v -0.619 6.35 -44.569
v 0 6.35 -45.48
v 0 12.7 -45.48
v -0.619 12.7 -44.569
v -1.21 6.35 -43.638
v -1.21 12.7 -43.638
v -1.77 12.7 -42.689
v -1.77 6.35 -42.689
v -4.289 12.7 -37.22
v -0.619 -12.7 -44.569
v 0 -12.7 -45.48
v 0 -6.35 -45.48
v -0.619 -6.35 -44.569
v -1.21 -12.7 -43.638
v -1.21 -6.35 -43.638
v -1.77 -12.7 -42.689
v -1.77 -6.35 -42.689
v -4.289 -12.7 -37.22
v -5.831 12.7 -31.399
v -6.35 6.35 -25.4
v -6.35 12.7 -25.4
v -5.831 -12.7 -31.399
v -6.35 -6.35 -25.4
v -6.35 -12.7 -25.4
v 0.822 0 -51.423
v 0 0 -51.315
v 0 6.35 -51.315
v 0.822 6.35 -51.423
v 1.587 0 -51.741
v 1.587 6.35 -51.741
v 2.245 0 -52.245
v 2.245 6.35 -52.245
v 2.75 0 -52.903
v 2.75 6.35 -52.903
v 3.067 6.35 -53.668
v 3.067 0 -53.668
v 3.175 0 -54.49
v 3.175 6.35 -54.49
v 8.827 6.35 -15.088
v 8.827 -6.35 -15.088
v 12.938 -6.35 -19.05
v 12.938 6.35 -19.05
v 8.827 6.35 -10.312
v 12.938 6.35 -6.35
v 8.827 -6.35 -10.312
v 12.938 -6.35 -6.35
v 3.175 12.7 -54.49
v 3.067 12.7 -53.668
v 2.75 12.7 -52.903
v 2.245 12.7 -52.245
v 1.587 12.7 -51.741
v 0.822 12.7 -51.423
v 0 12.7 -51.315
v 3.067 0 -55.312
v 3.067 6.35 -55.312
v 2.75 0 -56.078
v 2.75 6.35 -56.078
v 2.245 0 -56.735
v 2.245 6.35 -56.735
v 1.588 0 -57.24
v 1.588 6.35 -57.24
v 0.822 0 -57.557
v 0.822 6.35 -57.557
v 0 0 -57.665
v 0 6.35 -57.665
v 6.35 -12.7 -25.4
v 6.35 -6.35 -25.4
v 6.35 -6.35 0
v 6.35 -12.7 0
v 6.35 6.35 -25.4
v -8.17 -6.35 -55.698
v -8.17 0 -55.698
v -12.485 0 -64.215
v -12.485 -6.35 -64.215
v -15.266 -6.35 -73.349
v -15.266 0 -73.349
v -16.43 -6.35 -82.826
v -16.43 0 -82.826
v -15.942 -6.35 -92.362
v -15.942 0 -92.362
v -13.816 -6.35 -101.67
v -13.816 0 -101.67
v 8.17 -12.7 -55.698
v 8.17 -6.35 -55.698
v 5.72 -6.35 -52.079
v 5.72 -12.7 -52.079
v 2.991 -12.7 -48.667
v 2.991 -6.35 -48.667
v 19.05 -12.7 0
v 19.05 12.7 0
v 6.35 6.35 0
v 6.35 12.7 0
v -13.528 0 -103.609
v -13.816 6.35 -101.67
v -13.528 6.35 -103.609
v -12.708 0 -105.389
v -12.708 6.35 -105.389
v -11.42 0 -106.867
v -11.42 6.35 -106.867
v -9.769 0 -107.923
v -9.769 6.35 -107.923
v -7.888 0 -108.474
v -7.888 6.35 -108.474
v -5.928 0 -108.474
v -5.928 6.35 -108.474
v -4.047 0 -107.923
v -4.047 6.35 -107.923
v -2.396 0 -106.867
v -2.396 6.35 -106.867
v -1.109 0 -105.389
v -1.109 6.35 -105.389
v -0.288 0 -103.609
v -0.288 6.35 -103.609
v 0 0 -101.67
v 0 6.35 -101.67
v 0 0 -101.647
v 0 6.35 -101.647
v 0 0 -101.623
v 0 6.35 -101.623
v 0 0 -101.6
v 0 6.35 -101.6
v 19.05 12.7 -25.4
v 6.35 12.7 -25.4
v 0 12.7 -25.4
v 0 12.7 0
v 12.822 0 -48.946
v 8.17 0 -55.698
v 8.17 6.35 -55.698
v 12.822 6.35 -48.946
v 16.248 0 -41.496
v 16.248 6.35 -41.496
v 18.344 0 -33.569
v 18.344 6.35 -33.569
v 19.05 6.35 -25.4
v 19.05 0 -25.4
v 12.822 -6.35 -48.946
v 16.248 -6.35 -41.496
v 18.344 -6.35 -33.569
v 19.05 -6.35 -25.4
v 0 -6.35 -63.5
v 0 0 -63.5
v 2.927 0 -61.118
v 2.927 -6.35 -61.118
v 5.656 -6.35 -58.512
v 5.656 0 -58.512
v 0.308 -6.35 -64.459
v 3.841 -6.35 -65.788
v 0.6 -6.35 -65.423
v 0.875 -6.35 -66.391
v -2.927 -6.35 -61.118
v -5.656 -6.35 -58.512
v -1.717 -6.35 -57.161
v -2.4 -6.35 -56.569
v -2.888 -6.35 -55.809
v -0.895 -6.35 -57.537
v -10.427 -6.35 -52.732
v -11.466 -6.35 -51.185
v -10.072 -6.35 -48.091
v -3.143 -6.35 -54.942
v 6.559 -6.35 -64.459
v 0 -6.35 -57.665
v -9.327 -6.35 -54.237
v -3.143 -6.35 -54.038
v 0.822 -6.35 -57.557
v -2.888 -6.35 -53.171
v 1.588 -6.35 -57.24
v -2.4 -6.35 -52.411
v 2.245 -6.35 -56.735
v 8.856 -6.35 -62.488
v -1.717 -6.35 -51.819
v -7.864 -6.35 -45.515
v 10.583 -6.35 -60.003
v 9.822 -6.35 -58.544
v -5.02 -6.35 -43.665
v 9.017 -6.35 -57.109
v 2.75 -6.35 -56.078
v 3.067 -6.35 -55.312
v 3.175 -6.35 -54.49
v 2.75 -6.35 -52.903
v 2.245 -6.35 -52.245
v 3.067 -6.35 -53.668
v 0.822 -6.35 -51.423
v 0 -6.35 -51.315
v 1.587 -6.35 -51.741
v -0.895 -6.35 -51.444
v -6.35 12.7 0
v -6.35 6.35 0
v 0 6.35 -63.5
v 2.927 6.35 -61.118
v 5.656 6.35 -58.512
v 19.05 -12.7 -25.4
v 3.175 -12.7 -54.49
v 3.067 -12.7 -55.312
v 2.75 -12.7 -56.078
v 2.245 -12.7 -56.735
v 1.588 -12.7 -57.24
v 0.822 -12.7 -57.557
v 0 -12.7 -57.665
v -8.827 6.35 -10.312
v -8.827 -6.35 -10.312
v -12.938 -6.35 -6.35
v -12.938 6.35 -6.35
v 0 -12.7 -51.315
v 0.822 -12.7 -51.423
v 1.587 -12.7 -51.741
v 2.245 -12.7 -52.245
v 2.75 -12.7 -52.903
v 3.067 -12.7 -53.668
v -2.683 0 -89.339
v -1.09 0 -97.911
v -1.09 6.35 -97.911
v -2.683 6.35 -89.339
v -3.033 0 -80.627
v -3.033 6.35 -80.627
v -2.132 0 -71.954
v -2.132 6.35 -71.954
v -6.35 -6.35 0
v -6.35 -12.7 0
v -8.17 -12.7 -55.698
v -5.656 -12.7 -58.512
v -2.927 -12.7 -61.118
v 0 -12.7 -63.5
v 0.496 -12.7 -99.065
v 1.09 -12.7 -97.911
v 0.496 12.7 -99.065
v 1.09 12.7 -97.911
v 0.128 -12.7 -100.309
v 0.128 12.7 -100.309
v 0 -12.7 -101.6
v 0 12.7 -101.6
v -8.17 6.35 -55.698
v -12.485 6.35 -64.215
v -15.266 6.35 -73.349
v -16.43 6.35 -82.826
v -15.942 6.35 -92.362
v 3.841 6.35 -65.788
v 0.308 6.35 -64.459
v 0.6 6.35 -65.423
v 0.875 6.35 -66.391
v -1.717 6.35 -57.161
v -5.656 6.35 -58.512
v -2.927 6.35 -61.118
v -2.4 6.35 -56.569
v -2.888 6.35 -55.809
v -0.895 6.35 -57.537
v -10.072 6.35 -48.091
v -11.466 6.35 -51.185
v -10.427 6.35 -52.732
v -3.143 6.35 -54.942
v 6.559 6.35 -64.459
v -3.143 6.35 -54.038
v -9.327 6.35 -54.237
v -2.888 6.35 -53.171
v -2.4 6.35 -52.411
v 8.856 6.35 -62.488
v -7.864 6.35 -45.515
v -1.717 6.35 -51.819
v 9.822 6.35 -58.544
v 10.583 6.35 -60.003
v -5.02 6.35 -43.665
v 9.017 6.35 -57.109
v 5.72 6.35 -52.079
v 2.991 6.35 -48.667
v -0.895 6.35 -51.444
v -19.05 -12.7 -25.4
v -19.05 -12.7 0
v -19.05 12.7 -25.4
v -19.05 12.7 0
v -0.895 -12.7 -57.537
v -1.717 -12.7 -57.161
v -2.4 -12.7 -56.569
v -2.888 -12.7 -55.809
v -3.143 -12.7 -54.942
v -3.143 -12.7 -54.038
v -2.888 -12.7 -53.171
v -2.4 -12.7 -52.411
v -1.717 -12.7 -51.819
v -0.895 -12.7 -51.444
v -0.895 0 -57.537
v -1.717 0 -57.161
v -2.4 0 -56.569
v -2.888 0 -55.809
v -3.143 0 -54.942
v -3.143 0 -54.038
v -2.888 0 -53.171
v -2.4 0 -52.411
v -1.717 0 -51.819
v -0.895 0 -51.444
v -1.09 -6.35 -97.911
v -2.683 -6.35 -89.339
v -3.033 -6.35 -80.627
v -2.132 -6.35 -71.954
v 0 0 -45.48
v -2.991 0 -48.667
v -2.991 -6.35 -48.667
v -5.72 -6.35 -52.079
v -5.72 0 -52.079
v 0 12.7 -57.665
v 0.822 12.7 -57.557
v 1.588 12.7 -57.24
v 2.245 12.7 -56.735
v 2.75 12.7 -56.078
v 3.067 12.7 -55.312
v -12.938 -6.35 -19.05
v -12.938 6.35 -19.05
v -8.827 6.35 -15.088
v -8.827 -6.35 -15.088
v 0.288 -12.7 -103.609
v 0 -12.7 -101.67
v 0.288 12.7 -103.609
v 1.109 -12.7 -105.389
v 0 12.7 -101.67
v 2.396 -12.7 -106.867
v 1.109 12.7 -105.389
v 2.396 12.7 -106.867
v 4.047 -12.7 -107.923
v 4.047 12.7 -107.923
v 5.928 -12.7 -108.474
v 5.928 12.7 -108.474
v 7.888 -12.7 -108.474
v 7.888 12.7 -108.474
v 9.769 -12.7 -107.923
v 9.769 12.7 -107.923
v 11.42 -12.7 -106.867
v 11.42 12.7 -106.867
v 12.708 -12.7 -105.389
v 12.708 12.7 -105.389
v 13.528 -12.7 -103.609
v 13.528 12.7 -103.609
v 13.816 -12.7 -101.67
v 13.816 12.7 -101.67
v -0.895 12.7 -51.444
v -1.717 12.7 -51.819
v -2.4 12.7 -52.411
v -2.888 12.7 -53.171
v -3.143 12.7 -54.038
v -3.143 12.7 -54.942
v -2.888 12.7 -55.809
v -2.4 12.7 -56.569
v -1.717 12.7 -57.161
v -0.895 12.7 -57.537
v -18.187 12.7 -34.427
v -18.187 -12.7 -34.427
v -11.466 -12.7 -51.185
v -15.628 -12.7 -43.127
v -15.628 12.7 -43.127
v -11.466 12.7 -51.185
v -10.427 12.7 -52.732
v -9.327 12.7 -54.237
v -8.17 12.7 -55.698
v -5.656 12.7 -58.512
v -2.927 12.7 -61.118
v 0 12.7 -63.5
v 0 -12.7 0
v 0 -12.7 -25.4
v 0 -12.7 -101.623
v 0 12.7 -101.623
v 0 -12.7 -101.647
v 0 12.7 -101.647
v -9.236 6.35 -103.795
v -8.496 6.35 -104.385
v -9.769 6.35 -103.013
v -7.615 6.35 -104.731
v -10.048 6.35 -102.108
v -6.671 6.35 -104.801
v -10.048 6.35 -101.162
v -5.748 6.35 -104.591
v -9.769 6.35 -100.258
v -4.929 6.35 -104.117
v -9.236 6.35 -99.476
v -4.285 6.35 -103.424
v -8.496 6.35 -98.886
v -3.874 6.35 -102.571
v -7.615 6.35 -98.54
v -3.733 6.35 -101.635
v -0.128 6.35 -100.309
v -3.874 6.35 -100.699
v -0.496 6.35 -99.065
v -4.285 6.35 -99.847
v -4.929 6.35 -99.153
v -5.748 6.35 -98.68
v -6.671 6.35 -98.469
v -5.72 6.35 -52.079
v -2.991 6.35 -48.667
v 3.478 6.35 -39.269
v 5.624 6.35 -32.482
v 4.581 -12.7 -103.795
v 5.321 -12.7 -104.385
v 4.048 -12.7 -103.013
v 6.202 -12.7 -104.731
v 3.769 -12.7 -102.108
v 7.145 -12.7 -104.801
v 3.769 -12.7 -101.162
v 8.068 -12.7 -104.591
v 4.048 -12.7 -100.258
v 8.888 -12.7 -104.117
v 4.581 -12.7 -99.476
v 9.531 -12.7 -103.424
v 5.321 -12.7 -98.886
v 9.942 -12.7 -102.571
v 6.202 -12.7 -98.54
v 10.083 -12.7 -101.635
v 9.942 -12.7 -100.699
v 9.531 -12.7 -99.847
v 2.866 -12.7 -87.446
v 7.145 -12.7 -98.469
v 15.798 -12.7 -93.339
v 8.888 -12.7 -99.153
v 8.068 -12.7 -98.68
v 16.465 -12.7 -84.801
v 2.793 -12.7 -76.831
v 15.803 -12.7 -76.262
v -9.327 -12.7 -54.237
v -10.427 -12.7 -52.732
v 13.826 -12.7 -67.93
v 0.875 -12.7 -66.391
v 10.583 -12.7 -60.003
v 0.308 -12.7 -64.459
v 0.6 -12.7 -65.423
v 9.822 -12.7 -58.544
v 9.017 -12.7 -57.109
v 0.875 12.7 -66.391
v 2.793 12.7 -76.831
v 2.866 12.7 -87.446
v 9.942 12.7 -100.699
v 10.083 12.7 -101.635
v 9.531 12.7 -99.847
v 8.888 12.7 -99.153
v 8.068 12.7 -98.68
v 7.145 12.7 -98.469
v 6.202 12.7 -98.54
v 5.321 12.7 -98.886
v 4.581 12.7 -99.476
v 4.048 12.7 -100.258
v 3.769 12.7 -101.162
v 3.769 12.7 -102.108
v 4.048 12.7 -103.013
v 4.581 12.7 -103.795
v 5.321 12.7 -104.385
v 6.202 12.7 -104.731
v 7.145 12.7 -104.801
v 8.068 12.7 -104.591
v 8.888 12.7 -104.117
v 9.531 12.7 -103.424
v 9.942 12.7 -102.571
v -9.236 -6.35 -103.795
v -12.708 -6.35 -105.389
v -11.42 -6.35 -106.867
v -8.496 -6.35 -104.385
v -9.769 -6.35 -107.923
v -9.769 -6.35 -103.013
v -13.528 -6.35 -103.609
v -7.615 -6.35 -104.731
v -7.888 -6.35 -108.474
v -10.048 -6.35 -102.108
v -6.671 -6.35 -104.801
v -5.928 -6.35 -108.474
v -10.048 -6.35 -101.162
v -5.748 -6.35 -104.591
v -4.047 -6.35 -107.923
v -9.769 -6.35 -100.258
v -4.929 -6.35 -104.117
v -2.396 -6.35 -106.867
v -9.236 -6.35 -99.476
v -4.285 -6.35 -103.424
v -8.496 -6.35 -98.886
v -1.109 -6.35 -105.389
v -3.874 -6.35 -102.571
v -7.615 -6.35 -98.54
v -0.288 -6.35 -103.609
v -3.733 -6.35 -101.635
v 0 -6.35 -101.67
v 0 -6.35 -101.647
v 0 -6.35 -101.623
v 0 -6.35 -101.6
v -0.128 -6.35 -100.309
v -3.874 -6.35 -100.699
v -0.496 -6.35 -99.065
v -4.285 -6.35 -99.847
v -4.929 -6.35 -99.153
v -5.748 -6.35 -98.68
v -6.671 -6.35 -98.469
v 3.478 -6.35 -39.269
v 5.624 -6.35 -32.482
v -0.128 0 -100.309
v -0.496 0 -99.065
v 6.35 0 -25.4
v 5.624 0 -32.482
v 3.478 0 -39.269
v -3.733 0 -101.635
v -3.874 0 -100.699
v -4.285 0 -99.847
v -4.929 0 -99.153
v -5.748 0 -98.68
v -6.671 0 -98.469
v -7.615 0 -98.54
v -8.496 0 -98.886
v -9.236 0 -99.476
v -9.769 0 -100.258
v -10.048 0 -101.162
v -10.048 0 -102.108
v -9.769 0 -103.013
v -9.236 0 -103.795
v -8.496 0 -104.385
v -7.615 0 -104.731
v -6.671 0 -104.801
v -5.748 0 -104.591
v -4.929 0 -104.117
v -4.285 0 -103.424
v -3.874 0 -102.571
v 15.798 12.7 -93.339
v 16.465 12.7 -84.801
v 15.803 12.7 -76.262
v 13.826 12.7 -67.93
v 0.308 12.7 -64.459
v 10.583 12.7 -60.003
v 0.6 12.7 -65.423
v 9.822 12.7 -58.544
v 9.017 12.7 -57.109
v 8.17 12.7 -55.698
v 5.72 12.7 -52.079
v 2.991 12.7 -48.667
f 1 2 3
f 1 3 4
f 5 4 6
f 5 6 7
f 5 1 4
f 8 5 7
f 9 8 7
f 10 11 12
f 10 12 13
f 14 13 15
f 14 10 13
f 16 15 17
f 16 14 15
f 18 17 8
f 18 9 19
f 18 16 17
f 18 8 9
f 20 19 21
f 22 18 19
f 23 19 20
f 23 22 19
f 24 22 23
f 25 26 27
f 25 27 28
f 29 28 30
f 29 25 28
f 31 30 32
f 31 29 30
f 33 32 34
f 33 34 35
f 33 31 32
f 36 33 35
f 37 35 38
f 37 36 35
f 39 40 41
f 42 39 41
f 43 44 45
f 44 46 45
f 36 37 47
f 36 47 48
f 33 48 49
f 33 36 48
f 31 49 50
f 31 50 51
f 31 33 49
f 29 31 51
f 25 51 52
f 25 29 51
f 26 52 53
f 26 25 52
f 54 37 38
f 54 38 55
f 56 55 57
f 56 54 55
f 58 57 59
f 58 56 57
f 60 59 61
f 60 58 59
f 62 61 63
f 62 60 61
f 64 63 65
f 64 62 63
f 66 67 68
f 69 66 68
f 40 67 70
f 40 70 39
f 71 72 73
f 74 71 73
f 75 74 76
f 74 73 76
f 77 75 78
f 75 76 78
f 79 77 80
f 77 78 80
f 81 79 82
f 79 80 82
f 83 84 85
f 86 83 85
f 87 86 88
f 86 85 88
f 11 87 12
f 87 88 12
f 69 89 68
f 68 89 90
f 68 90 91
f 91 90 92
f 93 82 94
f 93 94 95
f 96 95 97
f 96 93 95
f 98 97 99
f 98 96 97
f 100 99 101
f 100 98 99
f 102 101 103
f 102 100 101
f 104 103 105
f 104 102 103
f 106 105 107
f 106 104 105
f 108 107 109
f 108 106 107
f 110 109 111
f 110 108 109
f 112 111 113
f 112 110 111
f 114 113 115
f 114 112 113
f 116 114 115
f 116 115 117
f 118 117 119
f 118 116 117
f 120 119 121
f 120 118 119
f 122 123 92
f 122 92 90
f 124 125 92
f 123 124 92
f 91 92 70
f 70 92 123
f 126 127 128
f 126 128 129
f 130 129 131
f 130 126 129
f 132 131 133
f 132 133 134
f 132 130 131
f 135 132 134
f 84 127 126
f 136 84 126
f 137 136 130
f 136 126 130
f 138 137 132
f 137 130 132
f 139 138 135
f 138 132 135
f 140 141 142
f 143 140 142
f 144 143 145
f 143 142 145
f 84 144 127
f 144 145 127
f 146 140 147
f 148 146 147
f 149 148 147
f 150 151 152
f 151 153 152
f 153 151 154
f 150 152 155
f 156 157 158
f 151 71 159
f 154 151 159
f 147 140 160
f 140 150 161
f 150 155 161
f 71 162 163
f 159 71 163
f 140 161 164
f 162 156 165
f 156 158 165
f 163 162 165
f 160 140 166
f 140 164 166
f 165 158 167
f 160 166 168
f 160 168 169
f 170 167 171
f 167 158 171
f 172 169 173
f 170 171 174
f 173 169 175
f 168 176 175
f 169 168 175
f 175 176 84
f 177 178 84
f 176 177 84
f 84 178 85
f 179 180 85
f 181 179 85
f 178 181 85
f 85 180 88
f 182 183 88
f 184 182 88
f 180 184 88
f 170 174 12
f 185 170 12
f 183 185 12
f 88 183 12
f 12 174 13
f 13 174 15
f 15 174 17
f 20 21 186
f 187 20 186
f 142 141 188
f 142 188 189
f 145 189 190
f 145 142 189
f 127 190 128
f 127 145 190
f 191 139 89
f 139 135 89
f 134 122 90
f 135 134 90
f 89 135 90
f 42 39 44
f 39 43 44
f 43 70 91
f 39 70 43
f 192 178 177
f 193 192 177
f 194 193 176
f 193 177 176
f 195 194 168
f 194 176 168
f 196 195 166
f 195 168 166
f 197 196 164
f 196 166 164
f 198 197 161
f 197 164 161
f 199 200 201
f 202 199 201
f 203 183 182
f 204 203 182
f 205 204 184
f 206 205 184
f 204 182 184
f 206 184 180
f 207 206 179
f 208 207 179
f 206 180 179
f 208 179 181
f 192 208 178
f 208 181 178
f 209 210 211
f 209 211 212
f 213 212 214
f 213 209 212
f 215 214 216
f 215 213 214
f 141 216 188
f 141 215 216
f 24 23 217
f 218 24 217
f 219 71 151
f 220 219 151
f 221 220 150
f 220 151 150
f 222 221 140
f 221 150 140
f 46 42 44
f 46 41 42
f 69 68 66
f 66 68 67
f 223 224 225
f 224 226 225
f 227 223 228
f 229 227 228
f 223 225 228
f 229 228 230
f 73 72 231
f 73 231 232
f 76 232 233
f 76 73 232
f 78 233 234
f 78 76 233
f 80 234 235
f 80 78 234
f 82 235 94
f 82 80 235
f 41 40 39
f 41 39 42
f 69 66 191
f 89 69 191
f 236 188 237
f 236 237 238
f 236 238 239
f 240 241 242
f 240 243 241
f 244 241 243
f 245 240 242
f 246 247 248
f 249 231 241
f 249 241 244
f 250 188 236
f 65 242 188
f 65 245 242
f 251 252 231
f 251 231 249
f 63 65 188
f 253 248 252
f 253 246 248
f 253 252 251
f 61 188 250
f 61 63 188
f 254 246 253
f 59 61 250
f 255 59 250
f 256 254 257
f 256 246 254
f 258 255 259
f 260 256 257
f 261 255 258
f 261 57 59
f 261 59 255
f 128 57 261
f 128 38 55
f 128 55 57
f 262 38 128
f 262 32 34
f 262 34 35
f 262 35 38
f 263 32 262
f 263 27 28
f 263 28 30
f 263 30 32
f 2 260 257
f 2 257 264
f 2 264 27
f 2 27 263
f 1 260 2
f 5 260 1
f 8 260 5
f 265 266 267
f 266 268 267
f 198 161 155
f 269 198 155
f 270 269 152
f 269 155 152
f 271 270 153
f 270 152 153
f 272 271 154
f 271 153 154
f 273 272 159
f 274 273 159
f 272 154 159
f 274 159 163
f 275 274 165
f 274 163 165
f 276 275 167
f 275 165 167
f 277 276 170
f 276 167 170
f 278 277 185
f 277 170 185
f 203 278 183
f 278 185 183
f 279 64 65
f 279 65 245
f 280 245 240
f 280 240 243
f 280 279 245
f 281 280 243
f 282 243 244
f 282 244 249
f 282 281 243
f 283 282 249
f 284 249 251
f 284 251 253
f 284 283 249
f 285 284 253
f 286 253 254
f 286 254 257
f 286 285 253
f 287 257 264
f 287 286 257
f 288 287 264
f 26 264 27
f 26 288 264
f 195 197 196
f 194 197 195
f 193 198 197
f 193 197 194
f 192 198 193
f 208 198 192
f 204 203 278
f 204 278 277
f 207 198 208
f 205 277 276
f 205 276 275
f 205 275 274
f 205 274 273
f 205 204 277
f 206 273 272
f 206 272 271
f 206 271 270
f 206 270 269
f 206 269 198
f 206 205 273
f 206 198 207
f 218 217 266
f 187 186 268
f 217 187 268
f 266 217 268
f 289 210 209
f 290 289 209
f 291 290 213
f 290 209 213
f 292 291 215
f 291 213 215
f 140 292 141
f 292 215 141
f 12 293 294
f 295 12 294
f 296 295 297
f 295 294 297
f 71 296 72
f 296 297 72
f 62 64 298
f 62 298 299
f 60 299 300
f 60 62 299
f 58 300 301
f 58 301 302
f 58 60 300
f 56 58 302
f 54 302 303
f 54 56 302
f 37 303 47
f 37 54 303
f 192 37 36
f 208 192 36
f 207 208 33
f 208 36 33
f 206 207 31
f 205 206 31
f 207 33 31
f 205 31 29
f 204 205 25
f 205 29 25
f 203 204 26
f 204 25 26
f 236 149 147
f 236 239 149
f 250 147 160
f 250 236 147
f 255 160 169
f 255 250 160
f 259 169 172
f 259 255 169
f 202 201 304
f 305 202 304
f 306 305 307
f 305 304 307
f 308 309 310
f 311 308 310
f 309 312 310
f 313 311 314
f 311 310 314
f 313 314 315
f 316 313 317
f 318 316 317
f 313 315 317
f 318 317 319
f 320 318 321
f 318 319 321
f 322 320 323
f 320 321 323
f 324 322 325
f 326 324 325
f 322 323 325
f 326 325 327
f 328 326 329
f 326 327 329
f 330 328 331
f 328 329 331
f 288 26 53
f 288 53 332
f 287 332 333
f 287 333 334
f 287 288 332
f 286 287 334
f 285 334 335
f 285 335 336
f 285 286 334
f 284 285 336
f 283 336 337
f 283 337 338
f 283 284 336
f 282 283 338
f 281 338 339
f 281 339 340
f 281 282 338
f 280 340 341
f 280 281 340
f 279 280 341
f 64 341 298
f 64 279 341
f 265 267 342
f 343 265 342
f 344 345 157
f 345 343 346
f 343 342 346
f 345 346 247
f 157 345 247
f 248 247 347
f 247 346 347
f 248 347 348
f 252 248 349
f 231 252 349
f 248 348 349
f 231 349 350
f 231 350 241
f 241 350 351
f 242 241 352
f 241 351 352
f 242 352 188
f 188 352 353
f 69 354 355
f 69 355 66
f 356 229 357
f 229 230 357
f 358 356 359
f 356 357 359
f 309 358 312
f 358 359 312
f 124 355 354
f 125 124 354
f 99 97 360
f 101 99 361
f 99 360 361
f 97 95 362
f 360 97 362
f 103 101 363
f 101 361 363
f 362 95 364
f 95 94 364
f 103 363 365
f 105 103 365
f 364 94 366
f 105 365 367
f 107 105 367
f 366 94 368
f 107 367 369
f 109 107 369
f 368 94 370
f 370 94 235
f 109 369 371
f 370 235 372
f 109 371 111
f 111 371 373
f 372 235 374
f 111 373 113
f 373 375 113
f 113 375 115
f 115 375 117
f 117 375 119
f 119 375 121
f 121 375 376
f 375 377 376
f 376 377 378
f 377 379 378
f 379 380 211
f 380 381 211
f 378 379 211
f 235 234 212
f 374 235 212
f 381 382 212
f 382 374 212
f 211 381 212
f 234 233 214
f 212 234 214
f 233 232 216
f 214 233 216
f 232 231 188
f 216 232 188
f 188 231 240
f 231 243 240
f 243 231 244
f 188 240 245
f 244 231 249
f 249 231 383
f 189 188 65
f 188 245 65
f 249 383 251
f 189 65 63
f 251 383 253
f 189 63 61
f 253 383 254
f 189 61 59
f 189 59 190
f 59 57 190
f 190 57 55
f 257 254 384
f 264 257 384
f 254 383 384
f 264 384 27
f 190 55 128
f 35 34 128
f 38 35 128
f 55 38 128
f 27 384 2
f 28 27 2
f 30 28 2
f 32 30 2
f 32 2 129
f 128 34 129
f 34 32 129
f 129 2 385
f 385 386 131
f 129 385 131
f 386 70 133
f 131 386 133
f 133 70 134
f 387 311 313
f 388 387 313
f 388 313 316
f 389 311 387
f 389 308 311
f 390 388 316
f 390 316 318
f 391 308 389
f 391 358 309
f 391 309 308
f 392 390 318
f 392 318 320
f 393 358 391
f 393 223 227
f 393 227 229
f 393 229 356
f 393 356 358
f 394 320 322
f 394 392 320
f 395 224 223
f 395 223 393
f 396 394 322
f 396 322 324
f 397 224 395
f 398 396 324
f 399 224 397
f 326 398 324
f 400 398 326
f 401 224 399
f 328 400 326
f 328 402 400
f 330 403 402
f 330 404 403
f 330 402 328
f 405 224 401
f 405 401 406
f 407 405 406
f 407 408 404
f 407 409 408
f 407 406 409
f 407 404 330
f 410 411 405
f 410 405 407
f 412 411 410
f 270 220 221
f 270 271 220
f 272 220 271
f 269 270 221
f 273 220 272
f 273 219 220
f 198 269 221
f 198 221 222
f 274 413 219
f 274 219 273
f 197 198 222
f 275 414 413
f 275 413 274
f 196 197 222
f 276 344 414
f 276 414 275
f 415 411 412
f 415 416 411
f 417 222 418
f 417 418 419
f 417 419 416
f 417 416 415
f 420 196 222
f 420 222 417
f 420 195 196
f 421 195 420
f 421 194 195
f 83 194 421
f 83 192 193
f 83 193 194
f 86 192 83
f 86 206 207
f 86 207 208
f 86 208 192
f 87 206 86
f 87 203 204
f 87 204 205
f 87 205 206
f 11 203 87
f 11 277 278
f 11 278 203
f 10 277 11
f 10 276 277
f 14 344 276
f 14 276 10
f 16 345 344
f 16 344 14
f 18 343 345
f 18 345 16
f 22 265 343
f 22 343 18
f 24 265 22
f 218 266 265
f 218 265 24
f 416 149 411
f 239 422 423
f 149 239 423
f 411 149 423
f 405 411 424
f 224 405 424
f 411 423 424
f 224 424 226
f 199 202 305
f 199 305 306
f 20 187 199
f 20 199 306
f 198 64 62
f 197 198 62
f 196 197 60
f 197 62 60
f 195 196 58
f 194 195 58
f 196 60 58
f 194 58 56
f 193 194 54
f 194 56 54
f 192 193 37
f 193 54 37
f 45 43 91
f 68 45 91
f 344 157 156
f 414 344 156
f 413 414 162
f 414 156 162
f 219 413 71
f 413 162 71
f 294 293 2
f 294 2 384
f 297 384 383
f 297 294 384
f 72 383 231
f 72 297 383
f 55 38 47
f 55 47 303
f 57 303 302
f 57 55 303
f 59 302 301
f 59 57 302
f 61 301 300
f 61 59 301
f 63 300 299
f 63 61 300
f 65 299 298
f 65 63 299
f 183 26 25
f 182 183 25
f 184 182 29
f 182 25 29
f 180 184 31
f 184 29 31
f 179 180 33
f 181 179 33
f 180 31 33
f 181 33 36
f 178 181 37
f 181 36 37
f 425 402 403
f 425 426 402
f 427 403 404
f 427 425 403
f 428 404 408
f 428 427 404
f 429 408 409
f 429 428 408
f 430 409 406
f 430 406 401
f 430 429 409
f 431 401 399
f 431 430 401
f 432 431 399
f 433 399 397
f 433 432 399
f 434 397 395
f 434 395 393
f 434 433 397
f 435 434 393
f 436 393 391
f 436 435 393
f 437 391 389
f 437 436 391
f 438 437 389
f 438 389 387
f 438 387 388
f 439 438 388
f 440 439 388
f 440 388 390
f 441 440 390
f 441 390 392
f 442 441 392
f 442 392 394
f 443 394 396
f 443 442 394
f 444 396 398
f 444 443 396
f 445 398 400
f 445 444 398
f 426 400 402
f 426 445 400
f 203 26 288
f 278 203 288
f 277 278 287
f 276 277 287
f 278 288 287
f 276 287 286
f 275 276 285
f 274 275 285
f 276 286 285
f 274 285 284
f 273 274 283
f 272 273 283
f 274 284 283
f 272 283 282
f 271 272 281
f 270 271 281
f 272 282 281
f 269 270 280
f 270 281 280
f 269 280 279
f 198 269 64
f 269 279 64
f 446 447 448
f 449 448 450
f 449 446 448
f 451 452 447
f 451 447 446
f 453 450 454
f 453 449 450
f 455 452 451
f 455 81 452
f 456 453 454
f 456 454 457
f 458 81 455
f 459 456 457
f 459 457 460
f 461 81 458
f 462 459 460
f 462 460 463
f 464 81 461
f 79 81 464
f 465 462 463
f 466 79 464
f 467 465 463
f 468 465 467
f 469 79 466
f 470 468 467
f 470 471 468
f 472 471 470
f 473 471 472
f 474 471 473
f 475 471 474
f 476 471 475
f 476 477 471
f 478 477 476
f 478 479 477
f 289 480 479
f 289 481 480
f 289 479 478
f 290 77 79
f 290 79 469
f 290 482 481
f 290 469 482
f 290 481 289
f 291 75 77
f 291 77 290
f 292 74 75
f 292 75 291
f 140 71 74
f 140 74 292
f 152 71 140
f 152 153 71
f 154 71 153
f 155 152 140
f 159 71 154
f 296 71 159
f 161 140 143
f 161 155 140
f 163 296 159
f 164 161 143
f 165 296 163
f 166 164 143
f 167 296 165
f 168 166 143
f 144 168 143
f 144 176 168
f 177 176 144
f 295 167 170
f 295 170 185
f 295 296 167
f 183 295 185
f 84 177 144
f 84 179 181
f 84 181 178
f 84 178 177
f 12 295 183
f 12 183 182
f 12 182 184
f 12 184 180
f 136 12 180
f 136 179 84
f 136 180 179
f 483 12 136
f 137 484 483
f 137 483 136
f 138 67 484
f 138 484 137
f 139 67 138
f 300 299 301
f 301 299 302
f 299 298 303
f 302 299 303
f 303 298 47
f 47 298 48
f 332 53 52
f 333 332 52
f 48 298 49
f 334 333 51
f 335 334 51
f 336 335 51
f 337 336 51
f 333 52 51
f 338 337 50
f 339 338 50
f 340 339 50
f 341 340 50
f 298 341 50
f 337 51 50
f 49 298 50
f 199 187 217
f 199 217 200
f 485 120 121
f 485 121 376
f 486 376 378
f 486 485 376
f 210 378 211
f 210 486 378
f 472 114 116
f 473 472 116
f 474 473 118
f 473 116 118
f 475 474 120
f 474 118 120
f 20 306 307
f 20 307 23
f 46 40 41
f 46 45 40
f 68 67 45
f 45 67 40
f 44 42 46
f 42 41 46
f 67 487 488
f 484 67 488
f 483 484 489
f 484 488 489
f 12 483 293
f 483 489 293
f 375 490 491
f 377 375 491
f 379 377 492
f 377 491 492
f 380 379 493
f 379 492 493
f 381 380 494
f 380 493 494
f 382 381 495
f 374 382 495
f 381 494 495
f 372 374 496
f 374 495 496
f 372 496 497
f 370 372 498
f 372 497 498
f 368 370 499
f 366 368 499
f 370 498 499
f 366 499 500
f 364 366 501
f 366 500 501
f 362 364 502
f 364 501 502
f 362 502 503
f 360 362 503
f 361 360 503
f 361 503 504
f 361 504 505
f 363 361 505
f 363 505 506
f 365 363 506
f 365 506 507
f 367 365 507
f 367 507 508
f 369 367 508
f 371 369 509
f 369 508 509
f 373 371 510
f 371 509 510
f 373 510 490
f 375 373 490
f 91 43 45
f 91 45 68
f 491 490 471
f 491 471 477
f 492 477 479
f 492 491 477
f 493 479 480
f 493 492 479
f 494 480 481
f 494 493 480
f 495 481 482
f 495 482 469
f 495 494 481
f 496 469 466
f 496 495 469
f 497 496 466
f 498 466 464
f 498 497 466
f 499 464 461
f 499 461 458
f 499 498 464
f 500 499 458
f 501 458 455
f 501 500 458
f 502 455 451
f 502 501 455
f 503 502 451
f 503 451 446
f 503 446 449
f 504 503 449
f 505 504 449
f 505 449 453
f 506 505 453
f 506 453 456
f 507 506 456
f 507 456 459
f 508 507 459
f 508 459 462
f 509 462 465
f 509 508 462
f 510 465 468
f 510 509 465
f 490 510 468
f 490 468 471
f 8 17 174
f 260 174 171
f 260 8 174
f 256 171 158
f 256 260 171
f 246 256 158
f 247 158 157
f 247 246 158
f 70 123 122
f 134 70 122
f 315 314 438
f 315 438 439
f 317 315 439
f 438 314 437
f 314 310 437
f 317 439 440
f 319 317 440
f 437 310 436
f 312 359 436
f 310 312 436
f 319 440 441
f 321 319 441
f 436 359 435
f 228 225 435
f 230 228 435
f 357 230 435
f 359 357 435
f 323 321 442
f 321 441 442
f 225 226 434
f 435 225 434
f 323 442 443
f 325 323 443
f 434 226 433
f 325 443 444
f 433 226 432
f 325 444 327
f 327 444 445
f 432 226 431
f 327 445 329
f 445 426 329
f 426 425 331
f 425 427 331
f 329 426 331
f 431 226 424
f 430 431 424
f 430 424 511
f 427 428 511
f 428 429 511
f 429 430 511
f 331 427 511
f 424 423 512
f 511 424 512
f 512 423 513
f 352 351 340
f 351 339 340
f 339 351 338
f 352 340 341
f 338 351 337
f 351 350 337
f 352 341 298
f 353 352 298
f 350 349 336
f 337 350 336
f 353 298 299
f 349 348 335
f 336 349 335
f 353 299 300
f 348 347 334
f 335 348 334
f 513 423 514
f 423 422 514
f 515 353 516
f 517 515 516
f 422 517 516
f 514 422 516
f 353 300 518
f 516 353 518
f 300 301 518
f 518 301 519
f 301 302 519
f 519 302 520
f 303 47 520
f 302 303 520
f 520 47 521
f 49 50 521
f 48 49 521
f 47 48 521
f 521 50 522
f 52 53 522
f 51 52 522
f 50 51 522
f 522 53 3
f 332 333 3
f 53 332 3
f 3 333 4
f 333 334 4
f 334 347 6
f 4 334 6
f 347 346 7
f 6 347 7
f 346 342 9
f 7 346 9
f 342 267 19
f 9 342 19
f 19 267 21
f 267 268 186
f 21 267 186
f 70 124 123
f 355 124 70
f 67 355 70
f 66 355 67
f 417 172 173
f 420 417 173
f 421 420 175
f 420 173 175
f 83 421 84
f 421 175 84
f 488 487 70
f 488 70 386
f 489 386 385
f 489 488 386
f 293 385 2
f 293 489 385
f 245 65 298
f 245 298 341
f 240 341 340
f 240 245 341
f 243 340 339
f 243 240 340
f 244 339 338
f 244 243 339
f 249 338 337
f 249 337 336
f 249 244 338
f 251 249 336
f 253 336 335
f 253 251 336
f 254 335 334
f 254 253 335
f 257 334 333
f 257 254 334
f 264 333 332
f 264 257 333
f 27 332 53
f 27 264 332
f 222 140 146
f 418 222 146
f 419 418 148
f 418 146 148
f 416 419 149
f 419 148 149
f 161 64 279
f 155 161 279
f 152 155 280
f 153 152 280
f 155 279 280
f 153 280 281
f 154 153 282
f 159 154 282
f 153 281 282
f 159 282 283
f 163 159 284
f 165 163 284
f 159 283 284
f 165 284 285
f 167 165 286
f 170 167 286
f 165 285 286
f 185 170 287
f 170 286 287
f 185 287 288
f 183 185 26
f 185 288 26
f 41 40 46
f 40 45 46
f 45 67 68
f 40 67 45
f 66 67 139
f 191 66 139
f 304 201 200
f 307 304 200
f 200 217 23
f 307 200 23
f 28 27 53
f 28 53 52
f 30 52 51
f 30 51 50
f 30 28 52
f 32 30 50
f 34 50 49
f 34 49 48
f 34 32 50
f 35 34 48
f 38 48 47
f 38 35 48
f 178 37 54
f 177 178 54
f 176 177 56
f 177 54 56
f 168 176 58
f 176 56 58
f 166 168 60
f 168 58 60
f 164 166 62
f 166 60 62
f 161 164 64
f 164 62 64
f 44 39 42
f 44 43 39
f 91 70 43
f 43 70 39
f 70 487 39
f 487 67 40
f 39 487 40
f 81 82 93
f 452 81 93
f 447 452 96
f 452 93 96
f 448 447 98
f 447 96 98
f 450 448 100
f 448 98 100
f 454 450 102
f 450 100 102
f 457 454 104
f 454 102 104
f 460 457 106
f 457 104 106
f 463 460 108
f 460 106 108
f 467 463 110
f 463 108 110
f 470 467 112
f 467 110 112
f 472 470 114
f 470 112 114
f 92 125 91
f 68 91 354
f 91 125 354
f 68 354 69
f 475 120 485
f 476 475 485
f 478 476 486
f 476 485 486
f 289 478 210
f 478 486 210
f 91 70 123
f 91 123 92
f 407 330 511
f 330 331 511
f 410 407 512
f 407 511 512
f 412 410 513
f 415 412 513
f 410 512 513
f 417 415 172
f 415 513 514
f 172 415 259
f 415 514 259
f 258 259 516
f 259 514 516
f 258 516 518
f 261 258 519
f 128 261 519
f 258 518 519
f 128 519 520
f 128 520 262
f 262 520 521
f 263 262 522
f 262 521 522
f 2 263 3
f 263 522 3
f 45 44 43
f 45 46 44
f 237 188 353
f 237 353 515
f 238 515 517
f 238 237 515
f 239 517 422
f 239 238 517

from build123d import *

# Parameters (mm, degrees)
F1_DEPTH      = 12.7
F1_DEPTH_BACK = 12.7
F2_DEPTH      = 6.35
F2_DEPTH_BACK = 6.35
F3_DEPTH      = 6.35
F3_DEPTH_BACK = 6.35
F0_W          = 6.35
F0_H          = 25.4
F4_DEPTH      = 12.7
F4_DEPTH_BACK = 12.7
F0_R          = 3.175
F5_DEPTH      = 6.35
F5_DEPTH_BACK = 6.35
F6_DEPTH      = 12.7
F6_DEPTH_BACK = 12.7
F7_DEPTH      = 6.35
F7_DEPTH_BACK = 6.35
F8_DEPTH      = 12.7
F8_DEPTH_BACK = 12.7


with BuildPart() as f1:
    # F0 (on Front) → F1 (new body, two sides)
    with BuildSketch(Plane.XZ) as f1_sk:
        Polygon((-8.827155169, -10.3124072454), (-6.35, 0), (-19.05, 0), (-19.05, -25.4), (-6.35, -25.4), (-8.827155169, -15.0875927546), (-12.9381986335, -19.05), (-12.9381986335, -12.7), (-12.9381986335, -6.35), align=None)
        Polygon((-6.35, -25.4), (-6.35, 0), (-8.827155169, -10.3124072454), (-12.9381986335, -6.35), (-12.9381986335, -12.7), (-12.9381986335, -19.05), (-8.827155169, -15.0875927546), align=None)
    extrude(amount=-F1_DEPTH)
    extrude(f1_sk.sketch, amount=F1_DEPTH_BACK)


with BuildPart() as f1b:
    # F0 (on Front) → F1, piece 2 (new body, two sides)
    with BuildSketch(Plane.XZ) as f1_2_sk:
        Polygon((19.05, 0), (6.35, 0), (8.827155169, -10.3124072454), (12.9381986335, -6.35), (12.9381986335, -12.7), (12.9381986335, -19.05), (8.827155169, -15.0875927546), (6.35, -25.4), (19.05, -25.4), align=None)
        Polygon((8.827155169, -10.3124072454), (6.35, 0), (6.35, -25.4), (8.827155169, -15.0875927546), (12.9381986335, -19.05), (12.9381986335, -12.7), (12.9381986335, -6.35), align=None)
    extrude(amount=-F1_DEPTH)
    extrude(f1_2_sk.sketch, amount=F1_DEPTH_BACK)


with BuildPart() as f2_tool:
    # F0 (on Front) → F2 (new body, two sides)
    with BuildSketch(Plane.XZ) as f2_sk:
        Polygon((8.827155169, -10.3124072454), (6.35, 0), (6.35, -25.4), (8.827155169, -15.0875927546), (12.9381986335, -19.05), (12.9381986335, -12.7), (12.9381986335, -6.35), align=None)
        Polygon((-6.35, -25.4), (-6.35, 0), (-8.827155169, -10.3124072454), (-12.9381986335, -6.35), (-12.9381986335, -12.7), (-12.9381986335, -19.05), (-8.827155169, -15.0875927546), align=None)
    extrude(amount=F2_DEPTH)
    extrude(f2_sk.sketch, amount=-F2_DEPTH_BACK)


with BuildPart() as f1_1:
    add(f1.part)

    # F2: cut by f2_tool
    add(f2_tool.part, mode=Mode.SUBTRACT)

    # F0 (on Front) → F6 (join, two sides)
    with BuildSketch(Plane.XZ) as f6_sk:
        with BuildLine():
            ThreePointArc((-1.7703138016, -42.6892323508), (-5.1856702357, -34.3427495905), (-6.35, -25.4))
            Line((-6.35, -25.4), (-19.05, -25.4))
            ThreePointArc((-19.05, -25.4), (-17.1147005889, -38.8384480167), (-11.4660888148, -51.1847208929))
            ThreePointArc((-11.4660888148, -51.1847208929), (-7.8640905354, -45.515061734), (-1.7703138016, -42.6892323508))
        make_face()
        with BuildLine():
            ThreePointArc((-8.1699275215, -55.6977049698), (-4.3890156004, -50.3459576296), (0, -45.4804631421))
            ThreePointArc((0, -45.4804631421), (-0.9181956043, -44.1058022562), (-1.7703138016, -42.6892323508))
            ThreePointArc((-1.7703138016, -42.6892323508), (-7.8640905354, -45.515061734), (-11.4660888148, -51.1847208929))
            ThreePointArc((-11.4660888148, -51.1847208929), (-9.8842619862, -53.4896029249), (-8.1699275215, -55.6977049698))
        make_face()
        with BuildLine():
            Line((0, -51.315231571), (0, -45.4804631421))
            ThreePointArc((0, -45.4804631421), (-4.3890156004, -50.3459576296), (-8.1699275215, -55.6977049698))
            ThreePointArc((-8.1699275215, -55.6977049698), (-4.3171295265, -59.8419575549), (0, -63.5))
            Line((0, -63.5), (0, -57.665231571))
            ThreePointArc((0, -57.665231571), (-3.175, -54.490231571), (0, -51.315231571))
        make_face()
        with BuildLine():
            ThreePointArc((8.1699275215, -55.6977049698), (4.3890156004, -50.3459576296), (0, -45.4804631421))
            Line((0, -45.4804631421), (0, -51.315231571))
            ThreePointArc((0, -51.315231571), (2.2450640303, -52.2451675408), (3.175, -54.490231571))
            ThreePointArc((3.175, -54.490231571), (2.2450640303, -56.7352956013), (0, -57.665231571))
            Line((0, -57.665231571), (0, -63.5))
            ThreePointArc((0, -63.5), (4.3171295265, -59.8419575549), (8.1699275215, -55.6977049698))
        make_face()
        with BuildLine():
            ThreePointArc((13.816319406, -101.6703248024), (16.2998142634, -80.5187022847), (10.5831374671, -60.0033790301))
            ThreePointArc((10.5831374671, -60.0033790301), (6.5593543364, -64.4588054029), (0.8753606705, -66.3911280603))
            ThreePointArc((0.8753606705, -66.3911280603), (3.0617092136, -82.1370373381), (1.0895635546, -97.9112067437))
            ThreePointArc((1.0895635546, -97.9112067437), (0.282876498, -99.6782440765), (0, -101.6))
            ThreePointArc((0, -101.6), (8.94874e-05, -101.6351624012), (0, -101.6703248024))
            ThreePointArc((0, -101.6703248024), (6.908159703, -108.5434115916), (13.816319406, -101.6703248024))
        make_face()
        with Locations((6.908159703, -101.6351624012)):
            Circle(F0_R, mode=Mode.SUBTRACT)
        with BuildLine():
            ThreePointArc((10.5831374671, -60.0033790301), (9.424729686, -57.8235288213), (8.1699275215, -55.6977049698))
            ThreePointArc((8.1699275215, -55.6977049698), (4.3171295265, -59.8419575549), (0, -63.5))
            ThreePointArc((0, -63.5), (0.4556473184, -64.9401240807), (0.8753606705, -66.3911280603))
            ThreePointArc((0.8753606705, -66.3911280603), (6.5593543364, -64.4588054029), (10.5831374671, -60.0033790301))
        make_face()
        with BuildLine():
            ThreePointArc((13.816319406, -101.6703248024), (16.2998142634, -80.5187022847), (10.5831374671, -60.0033790301))
            ThreePointArc((10.5831374671, -60.0033790301), (6.5593543364, -64.4588054029), (0.8753606705, -66.3911280603))
            ThreePointArc((0.8753606705, -66.3911280603), (3.0617092136, -82.1370373381), (1.0895635546, -97.9112067437))
            ThreePointArc((1.0895635546, -97.9112067437), (0.282876498, -99.6782440765), (0, -101.6))
            ThreePointArc((0, -101.6), (8.94874e-05, -101.6351624012), (0, -101.6703248024))
            ThreePointArc((0, -101.6703248024), (6.908159703, -108.5434115916), (13.816319406, -101.6703248024))
        make_face()
        with Locations((6.908159703, -101.6351624012)):
            Circle(F0_R, mode=Mode.SUBTRACT)
    extrude(amount=F6_DEPTH)
    extrude(f6_sk.sketch, amount=-F6_DEPTH_BACK)

    # F0 (on Front) → F7 (cut, two sides)
    with BuildSketch(Plane.XZ) as f7_sk:
        with BuildLine():
            ThreePointArc((-8.1699275215, -55.6977049698), (-4.3890156004, -50.3459576296), (0, -45.4804631421))
            ThreePointArc((0, -45.4804631421), (-0.9181956043, -44.1058022562), (-1.7703138016, -42.6892323508))
            ThreePointArc((-1.7703138016, -42.6892323508), (-7.8640905354, -45.515061734), (-11.4660888148, -51.1847208929))
            ThreePointArc((-11.4660888148, -51.1847208929), (-9.8842619862, -53.4896029249), (-8.1699275215, -55.6977049698))
        make_face()
        with BuildLine():
            Line((0, -51.315231571), (0, -45.4804631421))
            ThreePointArc((0, -45.4804631421), (-4.3890156004, -50.3459576296), (-8.1699275215, -55.6977049698))
            ThreePointArc((-8.1699275215, -55.6977049698), (-4.3171295265, -59.8419575549), (0, -63.5))
            Line((0, -63.5), (0, -57.665231571))
            ThreePointArc((0, -57.665231571), (-3.175, -54.490231571), (0, -51.315231571))
        make_face()
        with BuildLine():
            ThreePointArc((8.1699275215, -55.6977049698), (4.3890156004, -50.3459576296), (0, -45.4804631421))
            Line((0, -45.4804631421), (0, -51.315231571))
            ThreePointArc((0, -51.315231571), (2.2450640303, -52.2451675408), (3.175, -54.490231571))
            ThreePointArc((3.175, -54.490231571), (2.2450640303, -56.7352956013), (0, -57.665231571))
            Line((0, -57.665231571), (0, -63.5))
            ThreePointArc((0, -63.5), (4.3171295265, -59.8419575549), (8.1699275215, -55.6977049698))
        make_face()
        with BuildLine():
            ThreePointArc((10.5831374671, -60.0033790301), (9.424729686, -57.8235288213), (8.1699275215, -55.6977049698))
            ThreePointArc((8.1699275215, -55.6977049698), (4.3171295265, -59.8419575549), (0, -63.5))
            ThreePointArc((0, -63.5), (0.4556473184, -64.9401240807), (0.8753606705, -66.3911280603))
            ThreePointArc((0.8753606705, -66.3911280603), (6.5593543364, -64.4588054029), (10.5831374671, -60.0033790301))
        make_face()
    extrude(amount=F7_DEPTH, mode=Mode.SUBTRACT)
    extrude(f7_sk.sketch, amount=-F7_DEPTH_BACK, mode=Mode.SUBTRACT)


with BuildPart() as f1b_1:
    add(f1b.part)

    # F2: cut by f2_tool
    add(f2_tool.part, mode=Mode.SUBTRACT)

    # F0 (on Front) → F5 (join, two sides)
    with BuildSketch(Plane.XZ) as f5_sk:
        with BuildLine():
            Line((19.05, -25.4), (6.35, -25.4))
            ThreePointArc((6.35, -25.4), (4.7246809294, -35.9302837094), (0, -45.4804631421))
            ThreePointArc((0, -45.4804631421), (4.3890156004, -50.3459576296), (8.1699275215, -55.6977049698))
            ThreePointArc((8.1699275215, -55.6977049698), (16.2475266926, -41.4960158391), (19.05, -25.4))
        make_face()
        with BuildLine():
            ThreePointArc((8.1699275215, -55.6977049698), (4.3890156004, -50.3459576296), (0, -45.4804631421))
            Line((0, -45.4804631421), (0, -51.315231571))
            ThreePointArc((0, -51.315231571), (2.2450640303, -52.2451675408), (3.175, -54.490231571))
            ThreePointArc((3.175, -54.490231571), (2.2450640303, -56.7352956013), (0, -57.665231571))
            Line((0, -57.665231571), (0, -63.5))
            ThreePointArc((0, -63.5), (4.3171295265, -59.8419575549), (8.1699275215, -55.6977049698))
        make_face()
        with BuildLine():
            Line((0, -51.315231571), (0, -45.4804631421))
            ThreePointArc((0, -45.4804631421), (-4.3890156004, -50.3459576296), (-8.1699275215, -55.6977049698))
            ThreePointArc((-8.1699275215, -55.6977049698), (-4.3171295265, -59.8419575549), (0, -63.5))
            Line((0, -63.5), (0, -57.665231571))
            ThreePointArc((0, -57.665231571), (-3.175, -54.490231571), (0, -51.315231571))
        make_face()
        with BuildLine():
            ThreePointArc((0, -63.5), (-4.3171295265, -59.8419575549), (-8.1699275215, -55.6977049698))
            ThreePointArc((-8.1699275215, -55.6977049698), (-16.0538027814, -78.0624584307), (-13.816319406, -101.6703248024))
            ThreePointArc((-13.816319406, -101.6703248024), (-6.908159703, -108.5434115916), (0, -101.6703248024))
            ThreePointArc((0, -101.6703248024), (-8.94874e-05, -101.6351624012), (0, -101.6))
            ThreePointArc((0, -101.6), (-0.282876498, -99.6782440765), (-1.0895635546, -97.9112067437))
            ThreePointArc((-1.0895635546, -97.9112067437), (-3.0326733006, -80.626829153), (0, -63.5))
        make_face()
        with Locations((-6.908159703, -101.6351624012)):
            Circle(F0_R, mode=Mode.SUBTRACT)
    extrude(amount=F5_DEPTH)
    extrude(f5_sk.sketch, amount=-F5_DEPTH_BACK)


with BuildPart() as f3:
    # F0 (on Front) → F3 (new body, two sides)
    with BuildSketch(Plane.XZ) as f3_sk:
        Polygon((8.827155169, -10.3124072454), (6.35, 0), (6.35, -25.4), (8.827155169, -15.0875927546), (12.9381986335, -19.05), (12.9381986335, -12.7), (12.9381986335, -6.35), align=None)
    extrude(amount=F3_DEPTH)
    extrude(f3_sk.sketch, amount=-F3_DEPTH_BACK)

    # F0 (on Front) → F4 (join, two sides)
    with BuildSketch(Plane.XZ) as f4_sk:
        with Locations((3.175, -12.7)):
            Rectangle(F0_W, F0_H)
    extrude(amount=F4_DEPTH)
    extrude(f4_sk.sketch, amount=-F4_DEPTH_BACK)


with BuildPart() as f8:
    # F0 (on Front) → F8 (new body, two sides)
    with BuildSketch(Plane.XZ) as f8_sk:
        with BuildLine():
            Line((0, -57.665231571), (0, -51.315231571))
            ThreePointArc((0, -51.315231571), (-3.175, -54.490231571), (0, -57.665231571))
        make_face()
        with BuildLine():
            ThreePointArc((3.175, -54.490231571), (2.2450640303, -52.2451675408), (0, -51.315231571))
            Line((0, -51.315231571), (0, -57.665231571))
            ThreePointArc((0, -57.665231571), (2.2450640303, -56.7352956013), (3.175, -54.490231571))
        make_face()
    extrude(amount=F8_DEPTH)
    extrude(f8_sk.sketch, amount=-F8_DEPTH_BACK)


solid = Compound([f1_1.part, f1b_1.part, f3.part, f8.part])
